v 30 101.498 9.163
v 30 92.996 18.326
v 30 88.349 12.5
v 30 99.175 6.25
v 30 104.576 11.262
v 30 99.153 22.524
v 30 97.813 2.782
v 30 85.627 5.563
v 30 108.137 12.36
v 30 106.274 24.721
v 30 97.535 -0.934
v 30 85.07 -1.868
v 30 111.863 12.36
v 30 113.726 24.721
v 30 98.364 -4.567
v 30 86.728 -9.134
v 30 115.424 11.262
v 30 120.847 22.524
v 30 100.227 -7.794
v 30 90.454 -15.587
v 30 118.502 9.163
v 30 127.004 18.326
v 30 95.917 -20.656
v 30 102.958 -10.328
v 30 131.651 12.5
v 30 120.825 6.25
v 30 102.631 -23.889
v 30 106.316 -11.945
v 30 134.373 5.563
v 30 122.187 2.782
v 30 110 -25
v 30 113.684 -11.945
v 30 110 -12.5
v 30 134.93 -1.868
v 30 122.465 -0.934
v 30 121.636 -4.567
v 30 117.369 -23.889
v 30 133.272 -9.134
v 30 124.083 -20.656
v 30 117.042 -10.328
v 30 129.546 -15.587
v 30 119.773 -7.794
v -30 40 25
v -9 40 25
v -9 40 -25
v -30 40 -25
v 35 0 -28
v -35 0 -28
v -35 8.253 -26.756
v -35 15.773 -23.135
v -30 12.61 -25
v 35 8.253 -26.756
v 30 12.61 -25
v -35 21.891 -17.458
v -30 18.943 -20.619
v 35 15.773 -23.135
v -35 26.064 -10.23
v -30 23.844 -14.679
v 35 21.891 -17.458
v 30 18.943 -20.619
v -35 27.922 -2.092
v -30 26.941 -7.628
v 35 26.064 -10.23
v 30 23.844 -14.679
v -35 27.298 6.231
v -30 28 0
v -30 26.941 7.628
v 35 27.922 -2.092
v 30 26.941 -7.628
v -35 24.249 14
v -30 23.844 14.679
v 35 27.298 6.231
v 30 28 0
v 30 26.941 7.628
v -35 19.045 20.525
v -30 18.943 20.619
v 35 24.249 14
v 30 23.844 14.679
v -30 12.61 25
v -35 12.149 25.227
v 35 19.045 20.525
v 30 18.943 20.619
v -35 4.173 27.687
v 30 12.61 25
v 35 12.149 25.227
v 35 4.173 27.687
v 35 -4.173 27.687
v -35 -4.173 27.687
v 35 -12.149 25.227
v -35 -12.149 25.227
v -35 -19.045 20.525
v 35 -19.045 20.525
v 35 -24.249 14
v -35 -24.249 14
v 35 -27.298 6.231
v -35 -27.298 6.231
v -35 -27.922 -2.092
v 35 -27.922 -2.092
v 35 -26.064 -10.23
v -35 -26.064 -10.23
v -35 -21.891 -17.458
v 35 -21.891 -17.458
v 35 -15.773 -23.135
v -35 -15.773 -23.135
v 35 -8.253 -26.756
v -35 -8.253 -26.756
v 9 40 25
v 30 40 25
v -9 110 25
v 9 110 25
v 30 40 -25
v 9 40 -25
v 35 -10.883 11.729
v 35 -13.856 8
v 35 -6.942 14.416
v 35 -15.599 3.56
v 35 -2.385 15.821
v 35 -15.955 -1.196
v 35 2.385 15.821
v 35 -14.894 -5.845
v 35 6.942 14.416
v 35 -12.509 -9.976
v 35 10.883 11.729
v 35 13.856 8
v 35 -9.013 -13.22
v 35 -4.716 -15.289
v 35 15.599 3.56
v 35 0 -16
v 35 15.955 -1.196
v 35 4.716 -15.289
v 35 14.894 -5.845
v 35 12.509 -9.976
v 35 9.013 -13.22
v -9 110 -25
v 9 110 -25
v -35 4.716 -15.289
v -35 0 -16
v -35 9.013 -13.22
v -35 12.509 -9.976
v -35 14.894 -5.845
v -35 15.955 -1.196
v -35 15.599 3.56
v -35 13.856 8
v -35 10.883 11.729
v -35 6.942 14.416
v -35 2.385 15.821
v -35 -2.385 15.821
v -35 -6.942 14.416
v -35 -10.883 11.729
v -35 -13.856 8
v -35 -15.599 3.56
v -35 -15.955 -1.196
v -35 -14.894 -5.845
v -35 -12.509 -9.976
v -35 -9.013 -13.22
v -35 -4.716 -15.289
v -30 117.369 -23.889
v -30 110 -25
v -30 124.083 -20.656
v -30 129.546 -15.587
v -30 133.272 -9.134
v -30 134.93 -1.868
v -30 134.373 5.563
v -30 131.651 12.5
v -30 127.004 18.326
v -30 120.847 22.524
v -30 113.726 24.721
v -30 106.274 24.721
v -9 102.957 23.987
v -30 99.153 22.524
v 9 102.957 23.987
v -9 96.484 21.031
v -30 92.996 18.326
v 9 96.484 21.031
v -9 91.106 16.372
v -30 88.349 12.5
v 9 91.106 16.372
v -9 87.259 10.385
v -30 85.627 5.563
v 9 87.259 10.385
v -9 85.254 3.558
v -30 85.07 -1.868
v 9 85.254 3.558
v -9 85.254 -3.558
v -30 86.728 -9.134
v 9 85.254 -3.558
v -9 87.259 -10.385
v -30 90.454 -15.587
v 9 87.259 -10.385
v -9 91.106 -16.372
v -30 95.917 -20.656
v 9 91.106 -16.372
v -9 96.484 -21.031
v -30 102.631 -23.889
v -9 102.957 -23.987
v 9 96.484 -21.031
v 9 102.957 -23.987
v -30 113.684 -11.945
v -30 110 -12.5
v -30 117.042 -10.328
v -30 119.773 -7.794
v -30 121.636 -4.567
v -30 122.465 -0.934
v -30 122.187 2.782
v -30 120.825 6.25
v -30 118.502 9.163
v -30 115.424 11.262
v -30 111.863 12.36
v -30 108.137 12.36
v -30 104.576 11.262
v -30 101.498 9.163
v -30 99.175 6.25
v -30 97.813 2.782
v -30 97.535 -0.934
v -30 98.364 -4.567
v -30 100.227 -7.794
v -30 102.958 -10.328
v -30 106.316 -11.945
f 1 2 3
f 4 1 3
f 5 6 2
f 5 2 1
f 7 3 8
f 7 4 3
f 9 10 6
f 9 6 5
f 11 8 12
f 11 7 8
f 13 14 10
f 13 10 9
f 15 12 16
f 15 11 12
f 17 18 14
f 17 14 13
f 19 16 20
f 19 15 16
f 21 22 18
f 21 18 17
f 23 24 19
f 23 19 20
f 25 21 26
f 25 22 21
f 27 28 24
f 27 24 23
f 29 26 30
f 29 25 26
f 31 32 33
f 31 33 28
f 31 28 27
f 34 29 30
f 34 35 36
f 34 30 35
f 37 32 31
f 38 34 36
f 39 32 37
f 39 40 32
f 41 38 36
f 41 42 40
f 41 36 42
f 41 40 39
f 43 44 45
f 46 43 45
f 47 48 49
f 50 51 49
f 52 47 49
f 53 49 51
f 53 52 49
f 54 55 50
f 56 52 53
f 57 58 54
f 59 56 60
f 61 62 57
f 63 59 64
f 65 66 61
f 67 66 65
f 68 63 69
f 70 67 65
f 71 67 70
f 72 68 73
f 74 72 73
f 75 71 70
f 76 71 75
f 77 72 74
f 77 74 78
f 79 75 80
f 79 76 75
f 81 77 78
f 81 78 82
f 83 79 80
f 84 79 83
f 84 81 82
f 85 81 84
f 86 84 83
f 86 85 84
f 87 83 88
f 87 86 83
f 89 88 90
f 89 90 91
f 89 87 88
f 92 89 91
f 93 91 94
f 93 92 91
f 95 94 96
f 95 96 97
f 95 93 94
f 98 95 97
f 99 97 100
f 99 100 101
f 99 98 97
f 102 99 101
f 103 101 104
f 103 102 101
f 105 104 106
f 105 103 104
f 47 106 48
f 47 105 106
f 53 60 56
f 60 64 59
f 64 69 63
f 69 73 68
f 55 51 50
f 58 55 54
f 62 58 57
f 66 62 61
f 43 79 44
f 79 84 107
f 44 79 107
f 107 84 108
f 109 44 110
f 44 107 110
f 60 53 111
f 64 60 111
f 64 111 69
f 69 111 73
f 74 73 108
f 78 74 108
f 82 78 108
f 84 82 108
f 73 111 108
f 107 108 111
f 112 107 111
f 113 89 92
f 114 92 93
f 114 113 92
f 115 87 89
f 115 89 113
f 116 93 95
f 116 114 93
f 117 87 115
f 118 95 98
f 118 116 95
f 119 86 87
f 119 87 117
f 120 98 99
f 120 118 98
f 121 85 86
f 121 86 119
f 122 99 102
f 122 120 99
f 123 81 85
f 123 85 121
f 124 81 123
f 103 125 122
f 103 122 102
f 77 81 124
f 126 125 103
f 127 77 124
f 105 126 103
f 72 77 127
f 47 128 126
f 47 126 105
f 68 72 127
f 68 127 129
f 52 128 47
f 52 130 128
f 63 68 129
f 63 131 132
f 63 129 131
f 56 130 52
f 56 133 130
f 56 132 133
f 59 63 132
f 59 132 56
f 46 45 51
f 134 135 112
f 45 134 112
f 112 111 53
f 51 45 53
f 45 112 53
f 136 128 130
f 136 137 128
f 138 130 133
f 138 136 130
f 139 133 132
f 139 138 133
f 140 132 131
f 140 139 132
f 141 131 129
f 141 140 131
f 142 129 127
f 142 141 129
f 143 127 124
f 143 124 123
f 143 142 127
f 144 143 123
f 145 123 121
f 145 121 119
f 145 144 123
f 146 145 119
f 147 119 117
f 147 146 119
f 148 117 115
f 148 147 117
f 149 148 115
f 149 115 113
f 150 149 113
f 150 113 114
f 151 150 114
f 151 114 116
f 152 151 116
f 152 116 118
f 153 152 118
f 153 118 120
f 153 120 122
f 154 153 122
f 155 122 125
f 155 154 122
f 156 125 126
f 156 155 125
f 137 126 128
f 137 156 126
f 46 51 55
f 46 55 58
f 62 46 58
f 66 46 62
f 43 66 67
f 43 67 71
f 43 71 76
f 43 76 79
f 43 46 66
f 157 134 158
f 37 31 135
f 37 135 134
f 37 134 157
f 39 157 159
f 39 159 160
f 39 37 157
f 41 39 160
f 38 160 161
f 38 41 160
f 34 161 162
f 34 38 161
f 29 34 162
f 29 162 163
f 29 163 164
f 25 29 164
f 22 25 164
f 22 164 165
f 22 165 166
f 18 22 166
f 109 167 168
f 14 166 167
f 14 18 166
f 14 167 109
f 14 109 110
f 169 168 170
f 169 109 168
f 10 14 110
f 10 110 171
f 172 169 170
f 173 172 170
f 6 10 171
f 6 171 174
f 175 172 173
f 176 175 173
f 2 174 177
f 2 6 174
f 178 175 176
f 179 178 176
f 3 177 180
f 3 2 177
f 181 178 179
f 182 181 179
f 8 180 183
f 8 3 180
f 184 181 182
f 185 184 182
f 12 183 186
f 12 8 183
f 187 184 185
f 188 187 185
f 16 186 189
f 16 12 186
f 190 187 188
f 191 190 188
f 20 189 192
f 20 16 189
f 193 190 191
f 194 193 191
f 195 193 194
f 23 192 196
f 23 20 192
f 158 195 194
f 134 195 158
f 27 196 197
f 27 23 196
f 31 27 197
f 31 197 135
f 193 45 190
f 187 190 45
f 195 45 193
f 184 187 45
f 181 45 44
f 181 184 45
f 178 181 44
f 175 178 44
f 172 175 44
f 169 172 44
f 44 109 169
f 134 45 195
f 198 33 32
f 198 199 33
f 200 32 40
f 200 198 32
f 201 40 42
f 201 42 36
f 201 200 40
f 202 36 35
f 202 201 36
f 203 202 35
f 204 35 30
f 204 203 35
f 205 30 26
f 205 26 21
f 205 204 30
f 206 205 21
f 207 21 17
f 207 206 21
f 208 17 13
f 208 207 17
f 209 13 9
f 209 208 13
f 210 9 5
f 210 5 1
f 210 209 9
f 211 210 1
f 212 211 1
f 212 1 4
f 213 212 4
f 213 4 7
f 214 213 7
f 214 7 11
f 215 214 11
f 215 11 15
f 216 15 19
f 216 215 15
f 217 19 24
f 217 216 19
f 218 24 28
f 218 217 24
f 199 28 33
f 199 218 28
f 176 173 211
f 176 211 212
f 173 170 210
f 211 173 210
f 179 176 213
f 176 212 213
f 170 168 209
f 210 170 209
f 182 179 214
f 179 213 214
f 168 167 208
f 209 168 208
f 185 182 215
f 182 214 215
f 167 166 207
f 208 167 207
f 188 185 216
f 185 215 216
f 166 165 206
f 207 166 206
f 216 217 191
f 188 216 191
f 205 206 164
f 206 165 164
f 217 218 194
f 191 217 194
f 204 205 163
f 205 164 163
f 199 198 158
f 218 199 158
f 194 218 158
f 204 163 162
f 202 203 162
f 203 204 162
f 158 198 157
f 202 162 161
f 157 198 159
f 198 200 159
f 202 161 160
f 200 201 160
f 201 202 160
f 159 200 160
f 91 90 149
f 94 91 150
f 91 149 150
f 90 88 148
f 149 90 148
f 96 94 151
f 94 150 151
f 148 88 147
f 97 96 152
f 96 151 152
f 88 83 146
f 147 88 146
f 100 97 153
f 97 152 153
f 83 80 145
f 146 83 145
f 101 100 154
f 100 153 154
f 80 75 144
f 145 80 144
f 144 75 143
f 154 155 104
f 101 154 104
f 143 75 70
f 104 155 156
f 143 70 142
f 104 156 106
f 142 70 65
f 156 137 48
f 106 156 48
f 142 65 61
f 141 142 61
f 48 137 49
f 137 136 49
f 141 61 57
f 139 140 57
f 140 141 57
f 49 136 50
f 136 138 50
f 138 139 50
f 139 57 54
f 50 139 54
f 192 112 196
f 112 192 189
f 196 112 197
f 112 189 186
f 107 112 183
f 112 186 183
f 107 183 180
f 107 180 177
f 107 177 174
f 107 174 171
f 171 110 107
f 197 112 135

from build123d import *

# Parameters (mm, degrees)
SKETCH1_R           = 28
SKETCH1_R_2         = 16
BOSS_EXTRUDE1_DEPTH = 35
BOSS_EXTRUDE3_DEPTH = 30
BOSS_EXTRUDE4_DEPTH = 9
SKETCH5_R           = 25
SKETCH5_R_2         = 12.5
BOSS_EXTRUDE5_DEPTH = 30


with BuildPart() as part:
    # Sketch1 → Boss-Extrude1 (new, symmetric)
    with BuildSketch(Plane(origin=(0, 0, 0), x_dir=(0, 0, -1), z_dir=(1, 0, 0))):
        Circle(SKETCH1_R)
        Circle(SKETCH1_R_2, mode=Mode.SUBTRACT)
    extrude(amount=BOSS_EXTRUDE1_DEPTH, both=True)

    # Sketch2 → Boss-Extrude3 (add, symmetric)
    with BuildSketch(Plane(origin=(0, 0, 0), x_dir=(0, 0, -1), z_dir=(1, 0, 0))):
        with BuildLine():
            Line((-25, 40), (25, 40))
            Line((25, 40), (25, 12.609520213))
            ThreePointArc((25, 12.609520213), (0, 28), (-25, 12.609520213))
            Line((-25, 12.609520213), (-25, 40))
        make_face()
    extrude(amount=BOSS_EXTRUDE3_DEPTH, both=True)

    # Sketch3 → Boss-Extrude4 (add, symmetric)
    with BuildSketch(Plane(origin=(0, 0, 0), x_dir=(0, 0, -1), z_dir=(1, 0, 0))):
        with BuildLine():
            Line((-25, 40), (-25, 110))
            ThreePointArc((-25, 110), (0, 85), (25, 110))
            Line((25, 110), (25, 40))
            Line((25, 40), (-25, 40))
        make_face()
    extrude(amount=BOSS_EXTRUDE4_DEPTH, both=True)

    # Sketch5 → Boss-Extrude5 (add, symmetric)
    with BuildSketch(Plane(origin=(0, 0, 0), x_dir=(0, 0, -1), z_dir=(1, 0, 0))):
        with Locations((0, 110)):
            Circle(SKETCH5_R)
        with Locations((0, 110)):
            Circle(SKETCH5_R_2, mode=Mode.SUBTRACT)
    extrude(amount=BOSS_EXTRUDE5_DEPTH, both=True)


solid = part.part
